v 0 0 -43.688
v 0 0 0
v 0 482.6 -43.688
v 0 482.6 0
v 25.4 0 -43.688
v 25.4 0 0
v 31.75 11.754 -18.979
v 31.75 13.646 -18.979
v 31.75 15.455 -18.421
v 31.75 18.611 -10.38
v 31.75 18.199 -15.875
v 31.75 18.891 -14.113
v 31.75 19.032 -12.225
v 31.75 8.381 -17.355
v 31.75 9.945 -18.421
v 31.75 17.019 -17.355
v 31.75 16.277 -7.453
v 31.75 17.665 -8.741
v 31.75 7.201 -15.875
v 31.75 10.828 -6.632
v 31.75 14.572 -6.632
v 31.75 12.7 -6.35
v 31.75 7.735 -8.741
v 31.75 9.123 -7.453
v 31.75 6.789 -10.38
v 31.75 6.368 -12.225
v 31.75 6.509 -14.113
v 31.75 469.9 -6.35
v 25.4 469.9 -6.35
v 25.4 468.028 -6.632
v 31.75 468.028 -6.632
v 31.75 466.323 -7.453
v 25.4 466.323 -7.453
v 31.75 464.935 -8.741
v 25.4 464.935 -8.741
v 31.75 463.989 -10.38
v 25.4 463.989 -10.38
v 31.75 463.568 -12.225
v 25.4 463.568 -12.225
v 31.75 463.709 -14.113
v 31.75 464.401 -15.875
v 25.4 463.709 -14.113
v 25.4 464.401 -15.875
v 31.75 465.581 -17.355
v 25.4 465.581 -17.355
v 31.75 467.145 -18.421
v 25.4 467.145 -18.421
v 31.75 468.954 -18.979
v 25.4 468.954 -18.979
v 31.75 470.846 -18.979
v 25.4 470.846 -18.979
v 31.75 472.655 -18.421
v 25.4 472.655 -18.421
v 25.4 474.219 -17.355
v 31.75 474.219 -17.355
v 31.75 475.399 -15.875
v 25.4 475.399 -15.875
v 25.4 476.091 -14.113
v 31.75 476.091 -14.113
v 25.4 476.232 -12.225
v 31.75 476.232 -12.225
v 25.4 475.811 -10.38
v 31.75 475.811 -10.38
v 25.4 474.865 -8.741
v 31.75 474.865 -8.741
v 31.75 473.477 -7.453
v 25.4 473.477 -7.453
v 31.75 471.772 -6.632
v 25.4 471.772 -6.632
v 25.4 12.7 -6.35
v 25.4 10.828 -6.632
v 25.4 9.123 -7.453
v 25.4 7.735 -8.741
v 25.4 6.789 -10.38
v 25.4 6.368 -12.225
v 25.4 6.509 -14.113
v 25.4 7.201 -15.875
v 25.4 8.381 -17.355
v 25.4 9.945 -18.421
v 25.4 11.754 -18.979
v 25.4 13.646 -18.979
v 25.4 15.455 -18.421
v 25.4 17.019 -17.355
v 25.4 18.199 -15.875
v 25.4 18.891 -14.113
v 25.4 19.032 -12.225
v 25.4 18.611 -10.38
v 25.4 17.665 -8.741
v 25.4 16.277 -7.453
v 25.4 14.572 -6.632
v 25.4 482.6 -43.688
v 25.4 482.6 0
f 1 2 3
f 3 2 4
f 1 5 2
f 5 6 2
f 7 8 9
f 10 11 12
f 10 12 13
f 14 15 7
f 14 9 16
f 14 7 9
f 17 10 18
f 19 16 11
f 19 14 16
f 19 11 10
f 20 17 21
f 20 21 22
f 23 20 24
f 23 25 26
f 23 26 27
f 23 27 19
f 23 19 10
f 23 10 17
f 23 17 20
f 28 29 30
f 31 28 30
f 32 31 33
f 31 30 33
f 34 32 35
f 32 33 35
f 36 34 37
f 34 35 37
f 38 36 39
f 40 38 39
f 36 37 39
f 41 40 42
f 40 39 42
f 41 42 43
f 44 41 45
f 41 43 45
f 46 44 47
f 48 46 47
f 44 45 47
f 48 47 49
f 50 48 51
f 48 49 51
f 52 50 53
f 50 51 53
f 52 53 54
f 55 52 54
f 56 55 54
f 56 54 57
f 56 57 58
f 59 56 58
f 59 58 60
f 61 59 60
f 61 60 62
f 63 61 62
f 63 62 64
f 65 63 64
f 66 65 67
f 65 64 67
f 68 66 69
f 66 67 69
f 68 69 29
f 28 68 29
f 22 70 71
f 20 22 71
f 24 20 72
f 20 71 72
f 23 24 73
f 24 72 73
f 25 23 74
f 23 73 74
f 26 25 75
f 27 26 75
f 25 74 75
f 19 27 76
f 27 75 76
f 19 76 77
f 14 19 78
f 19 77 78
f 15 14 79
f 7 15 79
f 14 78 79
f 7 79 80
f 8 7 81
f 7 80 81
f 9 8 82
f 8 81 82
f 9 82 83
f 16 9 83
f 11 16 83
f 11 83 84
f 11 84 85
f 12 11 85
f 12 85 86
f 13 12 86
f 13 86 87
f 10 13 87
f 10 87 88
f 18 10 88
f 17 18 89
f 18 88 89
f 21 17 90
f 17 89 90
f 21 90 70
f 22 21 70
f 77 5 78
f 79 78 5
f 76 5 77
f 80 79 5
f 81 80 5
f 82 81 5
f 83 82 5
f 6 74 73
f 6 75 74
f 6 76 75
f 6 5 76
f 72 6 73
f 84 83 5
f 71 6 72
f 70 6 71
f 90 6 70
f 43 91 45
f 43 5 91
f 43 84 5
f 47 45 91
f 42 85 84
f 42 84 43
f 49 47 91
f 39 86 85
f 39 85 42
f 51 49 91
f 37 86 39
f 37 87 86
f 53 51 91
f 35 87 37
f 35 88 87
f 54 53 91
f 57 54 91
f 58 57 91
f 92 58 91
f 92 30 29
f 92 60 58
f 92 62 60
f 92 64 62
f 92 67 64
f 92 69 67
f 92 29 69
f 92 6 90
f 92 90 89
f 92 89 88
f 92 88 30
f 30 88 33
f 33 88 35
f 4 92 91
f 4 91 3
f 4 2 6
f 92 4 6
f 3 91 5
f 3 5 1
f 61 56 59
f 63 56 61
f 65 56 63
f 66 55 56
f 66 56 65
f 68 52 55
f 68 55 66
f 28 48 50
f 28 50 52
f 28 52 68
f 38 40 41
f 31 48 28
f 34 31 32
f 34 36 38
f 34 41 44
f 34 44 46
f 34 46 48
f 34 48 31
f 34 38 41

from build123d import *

# Parameters (mm, degrees)
SKETCH1_W           = 25.4
SKETCH1_H           = 25.4
BOSS_EXTRUDE1_DEPTH = 482.6
SKETCH2_R           = 6.35
BOSS_EXTRUDE2_DEPTH = 6.35
SKETCH3_R           = 6.35
BOSS_EXTRUDE3_DEPTH = 6.35
SKETCH4_W           = 25.4
SKETCH4_H           = 482.6
BOSS_EXTRUDE4_DEPTH = 18.288


with BuildPart() as part:
    # Sketch1 → Boss-Extrude1 (new body)
    with BuildSketch(Plane(origin=(0, 0, 0), x_dir=(1, 0, 0), z_dir=(0, 1, 0))):
        with Locations((12.7, 12.7)):
            Rectangle(SKETCH1_W, SKETCH1_H)
    extrude(amount=BOSS_EXTRUDE1_DEPTH)

    # Sketch2 → Boss-Extrude2 (add)
    with BuildSketch(Plane(origin=(25.4, 0, 0), x_dir=(0, 0, -1), z_dir=(1, 0, 0))):
        with Locations(Location((12.7, 469.9, 0), (0, 0, 180))):
            Circle(SKETCH2_R)
    extrude(amount=BOSS_EXTRUDE2_DEPTH)

    # Sketch3 → Boss-Extrude3 (add)
    with BuildSketch(Plane(origin=(25.4, 0, 0), x_dir=(0, 0, -1), z_dir=(1, 0, 0))):
        with Locations(Location((12.7, 12.7, 0), (0, 0, 180))):
            Circle(SKETCH3_R)
    extrude(amount=BOSS_EXTRUDE3_DEPTH)

    # Sketch4 → Boss-Extrude4 (add)
    with BuildSketch(Plane(origin=(0, 0, -25.4), x_dir=(-1, 0, 0), z_dir=(0, 0, -1))):
        with Locations((-12.7, 241.3)):
            Rectangle(SKETCH4_W, SKETCH4_H)
    extrude(amount=BOSS_EXTRUDE4_DEPTH)


solid = part.part
